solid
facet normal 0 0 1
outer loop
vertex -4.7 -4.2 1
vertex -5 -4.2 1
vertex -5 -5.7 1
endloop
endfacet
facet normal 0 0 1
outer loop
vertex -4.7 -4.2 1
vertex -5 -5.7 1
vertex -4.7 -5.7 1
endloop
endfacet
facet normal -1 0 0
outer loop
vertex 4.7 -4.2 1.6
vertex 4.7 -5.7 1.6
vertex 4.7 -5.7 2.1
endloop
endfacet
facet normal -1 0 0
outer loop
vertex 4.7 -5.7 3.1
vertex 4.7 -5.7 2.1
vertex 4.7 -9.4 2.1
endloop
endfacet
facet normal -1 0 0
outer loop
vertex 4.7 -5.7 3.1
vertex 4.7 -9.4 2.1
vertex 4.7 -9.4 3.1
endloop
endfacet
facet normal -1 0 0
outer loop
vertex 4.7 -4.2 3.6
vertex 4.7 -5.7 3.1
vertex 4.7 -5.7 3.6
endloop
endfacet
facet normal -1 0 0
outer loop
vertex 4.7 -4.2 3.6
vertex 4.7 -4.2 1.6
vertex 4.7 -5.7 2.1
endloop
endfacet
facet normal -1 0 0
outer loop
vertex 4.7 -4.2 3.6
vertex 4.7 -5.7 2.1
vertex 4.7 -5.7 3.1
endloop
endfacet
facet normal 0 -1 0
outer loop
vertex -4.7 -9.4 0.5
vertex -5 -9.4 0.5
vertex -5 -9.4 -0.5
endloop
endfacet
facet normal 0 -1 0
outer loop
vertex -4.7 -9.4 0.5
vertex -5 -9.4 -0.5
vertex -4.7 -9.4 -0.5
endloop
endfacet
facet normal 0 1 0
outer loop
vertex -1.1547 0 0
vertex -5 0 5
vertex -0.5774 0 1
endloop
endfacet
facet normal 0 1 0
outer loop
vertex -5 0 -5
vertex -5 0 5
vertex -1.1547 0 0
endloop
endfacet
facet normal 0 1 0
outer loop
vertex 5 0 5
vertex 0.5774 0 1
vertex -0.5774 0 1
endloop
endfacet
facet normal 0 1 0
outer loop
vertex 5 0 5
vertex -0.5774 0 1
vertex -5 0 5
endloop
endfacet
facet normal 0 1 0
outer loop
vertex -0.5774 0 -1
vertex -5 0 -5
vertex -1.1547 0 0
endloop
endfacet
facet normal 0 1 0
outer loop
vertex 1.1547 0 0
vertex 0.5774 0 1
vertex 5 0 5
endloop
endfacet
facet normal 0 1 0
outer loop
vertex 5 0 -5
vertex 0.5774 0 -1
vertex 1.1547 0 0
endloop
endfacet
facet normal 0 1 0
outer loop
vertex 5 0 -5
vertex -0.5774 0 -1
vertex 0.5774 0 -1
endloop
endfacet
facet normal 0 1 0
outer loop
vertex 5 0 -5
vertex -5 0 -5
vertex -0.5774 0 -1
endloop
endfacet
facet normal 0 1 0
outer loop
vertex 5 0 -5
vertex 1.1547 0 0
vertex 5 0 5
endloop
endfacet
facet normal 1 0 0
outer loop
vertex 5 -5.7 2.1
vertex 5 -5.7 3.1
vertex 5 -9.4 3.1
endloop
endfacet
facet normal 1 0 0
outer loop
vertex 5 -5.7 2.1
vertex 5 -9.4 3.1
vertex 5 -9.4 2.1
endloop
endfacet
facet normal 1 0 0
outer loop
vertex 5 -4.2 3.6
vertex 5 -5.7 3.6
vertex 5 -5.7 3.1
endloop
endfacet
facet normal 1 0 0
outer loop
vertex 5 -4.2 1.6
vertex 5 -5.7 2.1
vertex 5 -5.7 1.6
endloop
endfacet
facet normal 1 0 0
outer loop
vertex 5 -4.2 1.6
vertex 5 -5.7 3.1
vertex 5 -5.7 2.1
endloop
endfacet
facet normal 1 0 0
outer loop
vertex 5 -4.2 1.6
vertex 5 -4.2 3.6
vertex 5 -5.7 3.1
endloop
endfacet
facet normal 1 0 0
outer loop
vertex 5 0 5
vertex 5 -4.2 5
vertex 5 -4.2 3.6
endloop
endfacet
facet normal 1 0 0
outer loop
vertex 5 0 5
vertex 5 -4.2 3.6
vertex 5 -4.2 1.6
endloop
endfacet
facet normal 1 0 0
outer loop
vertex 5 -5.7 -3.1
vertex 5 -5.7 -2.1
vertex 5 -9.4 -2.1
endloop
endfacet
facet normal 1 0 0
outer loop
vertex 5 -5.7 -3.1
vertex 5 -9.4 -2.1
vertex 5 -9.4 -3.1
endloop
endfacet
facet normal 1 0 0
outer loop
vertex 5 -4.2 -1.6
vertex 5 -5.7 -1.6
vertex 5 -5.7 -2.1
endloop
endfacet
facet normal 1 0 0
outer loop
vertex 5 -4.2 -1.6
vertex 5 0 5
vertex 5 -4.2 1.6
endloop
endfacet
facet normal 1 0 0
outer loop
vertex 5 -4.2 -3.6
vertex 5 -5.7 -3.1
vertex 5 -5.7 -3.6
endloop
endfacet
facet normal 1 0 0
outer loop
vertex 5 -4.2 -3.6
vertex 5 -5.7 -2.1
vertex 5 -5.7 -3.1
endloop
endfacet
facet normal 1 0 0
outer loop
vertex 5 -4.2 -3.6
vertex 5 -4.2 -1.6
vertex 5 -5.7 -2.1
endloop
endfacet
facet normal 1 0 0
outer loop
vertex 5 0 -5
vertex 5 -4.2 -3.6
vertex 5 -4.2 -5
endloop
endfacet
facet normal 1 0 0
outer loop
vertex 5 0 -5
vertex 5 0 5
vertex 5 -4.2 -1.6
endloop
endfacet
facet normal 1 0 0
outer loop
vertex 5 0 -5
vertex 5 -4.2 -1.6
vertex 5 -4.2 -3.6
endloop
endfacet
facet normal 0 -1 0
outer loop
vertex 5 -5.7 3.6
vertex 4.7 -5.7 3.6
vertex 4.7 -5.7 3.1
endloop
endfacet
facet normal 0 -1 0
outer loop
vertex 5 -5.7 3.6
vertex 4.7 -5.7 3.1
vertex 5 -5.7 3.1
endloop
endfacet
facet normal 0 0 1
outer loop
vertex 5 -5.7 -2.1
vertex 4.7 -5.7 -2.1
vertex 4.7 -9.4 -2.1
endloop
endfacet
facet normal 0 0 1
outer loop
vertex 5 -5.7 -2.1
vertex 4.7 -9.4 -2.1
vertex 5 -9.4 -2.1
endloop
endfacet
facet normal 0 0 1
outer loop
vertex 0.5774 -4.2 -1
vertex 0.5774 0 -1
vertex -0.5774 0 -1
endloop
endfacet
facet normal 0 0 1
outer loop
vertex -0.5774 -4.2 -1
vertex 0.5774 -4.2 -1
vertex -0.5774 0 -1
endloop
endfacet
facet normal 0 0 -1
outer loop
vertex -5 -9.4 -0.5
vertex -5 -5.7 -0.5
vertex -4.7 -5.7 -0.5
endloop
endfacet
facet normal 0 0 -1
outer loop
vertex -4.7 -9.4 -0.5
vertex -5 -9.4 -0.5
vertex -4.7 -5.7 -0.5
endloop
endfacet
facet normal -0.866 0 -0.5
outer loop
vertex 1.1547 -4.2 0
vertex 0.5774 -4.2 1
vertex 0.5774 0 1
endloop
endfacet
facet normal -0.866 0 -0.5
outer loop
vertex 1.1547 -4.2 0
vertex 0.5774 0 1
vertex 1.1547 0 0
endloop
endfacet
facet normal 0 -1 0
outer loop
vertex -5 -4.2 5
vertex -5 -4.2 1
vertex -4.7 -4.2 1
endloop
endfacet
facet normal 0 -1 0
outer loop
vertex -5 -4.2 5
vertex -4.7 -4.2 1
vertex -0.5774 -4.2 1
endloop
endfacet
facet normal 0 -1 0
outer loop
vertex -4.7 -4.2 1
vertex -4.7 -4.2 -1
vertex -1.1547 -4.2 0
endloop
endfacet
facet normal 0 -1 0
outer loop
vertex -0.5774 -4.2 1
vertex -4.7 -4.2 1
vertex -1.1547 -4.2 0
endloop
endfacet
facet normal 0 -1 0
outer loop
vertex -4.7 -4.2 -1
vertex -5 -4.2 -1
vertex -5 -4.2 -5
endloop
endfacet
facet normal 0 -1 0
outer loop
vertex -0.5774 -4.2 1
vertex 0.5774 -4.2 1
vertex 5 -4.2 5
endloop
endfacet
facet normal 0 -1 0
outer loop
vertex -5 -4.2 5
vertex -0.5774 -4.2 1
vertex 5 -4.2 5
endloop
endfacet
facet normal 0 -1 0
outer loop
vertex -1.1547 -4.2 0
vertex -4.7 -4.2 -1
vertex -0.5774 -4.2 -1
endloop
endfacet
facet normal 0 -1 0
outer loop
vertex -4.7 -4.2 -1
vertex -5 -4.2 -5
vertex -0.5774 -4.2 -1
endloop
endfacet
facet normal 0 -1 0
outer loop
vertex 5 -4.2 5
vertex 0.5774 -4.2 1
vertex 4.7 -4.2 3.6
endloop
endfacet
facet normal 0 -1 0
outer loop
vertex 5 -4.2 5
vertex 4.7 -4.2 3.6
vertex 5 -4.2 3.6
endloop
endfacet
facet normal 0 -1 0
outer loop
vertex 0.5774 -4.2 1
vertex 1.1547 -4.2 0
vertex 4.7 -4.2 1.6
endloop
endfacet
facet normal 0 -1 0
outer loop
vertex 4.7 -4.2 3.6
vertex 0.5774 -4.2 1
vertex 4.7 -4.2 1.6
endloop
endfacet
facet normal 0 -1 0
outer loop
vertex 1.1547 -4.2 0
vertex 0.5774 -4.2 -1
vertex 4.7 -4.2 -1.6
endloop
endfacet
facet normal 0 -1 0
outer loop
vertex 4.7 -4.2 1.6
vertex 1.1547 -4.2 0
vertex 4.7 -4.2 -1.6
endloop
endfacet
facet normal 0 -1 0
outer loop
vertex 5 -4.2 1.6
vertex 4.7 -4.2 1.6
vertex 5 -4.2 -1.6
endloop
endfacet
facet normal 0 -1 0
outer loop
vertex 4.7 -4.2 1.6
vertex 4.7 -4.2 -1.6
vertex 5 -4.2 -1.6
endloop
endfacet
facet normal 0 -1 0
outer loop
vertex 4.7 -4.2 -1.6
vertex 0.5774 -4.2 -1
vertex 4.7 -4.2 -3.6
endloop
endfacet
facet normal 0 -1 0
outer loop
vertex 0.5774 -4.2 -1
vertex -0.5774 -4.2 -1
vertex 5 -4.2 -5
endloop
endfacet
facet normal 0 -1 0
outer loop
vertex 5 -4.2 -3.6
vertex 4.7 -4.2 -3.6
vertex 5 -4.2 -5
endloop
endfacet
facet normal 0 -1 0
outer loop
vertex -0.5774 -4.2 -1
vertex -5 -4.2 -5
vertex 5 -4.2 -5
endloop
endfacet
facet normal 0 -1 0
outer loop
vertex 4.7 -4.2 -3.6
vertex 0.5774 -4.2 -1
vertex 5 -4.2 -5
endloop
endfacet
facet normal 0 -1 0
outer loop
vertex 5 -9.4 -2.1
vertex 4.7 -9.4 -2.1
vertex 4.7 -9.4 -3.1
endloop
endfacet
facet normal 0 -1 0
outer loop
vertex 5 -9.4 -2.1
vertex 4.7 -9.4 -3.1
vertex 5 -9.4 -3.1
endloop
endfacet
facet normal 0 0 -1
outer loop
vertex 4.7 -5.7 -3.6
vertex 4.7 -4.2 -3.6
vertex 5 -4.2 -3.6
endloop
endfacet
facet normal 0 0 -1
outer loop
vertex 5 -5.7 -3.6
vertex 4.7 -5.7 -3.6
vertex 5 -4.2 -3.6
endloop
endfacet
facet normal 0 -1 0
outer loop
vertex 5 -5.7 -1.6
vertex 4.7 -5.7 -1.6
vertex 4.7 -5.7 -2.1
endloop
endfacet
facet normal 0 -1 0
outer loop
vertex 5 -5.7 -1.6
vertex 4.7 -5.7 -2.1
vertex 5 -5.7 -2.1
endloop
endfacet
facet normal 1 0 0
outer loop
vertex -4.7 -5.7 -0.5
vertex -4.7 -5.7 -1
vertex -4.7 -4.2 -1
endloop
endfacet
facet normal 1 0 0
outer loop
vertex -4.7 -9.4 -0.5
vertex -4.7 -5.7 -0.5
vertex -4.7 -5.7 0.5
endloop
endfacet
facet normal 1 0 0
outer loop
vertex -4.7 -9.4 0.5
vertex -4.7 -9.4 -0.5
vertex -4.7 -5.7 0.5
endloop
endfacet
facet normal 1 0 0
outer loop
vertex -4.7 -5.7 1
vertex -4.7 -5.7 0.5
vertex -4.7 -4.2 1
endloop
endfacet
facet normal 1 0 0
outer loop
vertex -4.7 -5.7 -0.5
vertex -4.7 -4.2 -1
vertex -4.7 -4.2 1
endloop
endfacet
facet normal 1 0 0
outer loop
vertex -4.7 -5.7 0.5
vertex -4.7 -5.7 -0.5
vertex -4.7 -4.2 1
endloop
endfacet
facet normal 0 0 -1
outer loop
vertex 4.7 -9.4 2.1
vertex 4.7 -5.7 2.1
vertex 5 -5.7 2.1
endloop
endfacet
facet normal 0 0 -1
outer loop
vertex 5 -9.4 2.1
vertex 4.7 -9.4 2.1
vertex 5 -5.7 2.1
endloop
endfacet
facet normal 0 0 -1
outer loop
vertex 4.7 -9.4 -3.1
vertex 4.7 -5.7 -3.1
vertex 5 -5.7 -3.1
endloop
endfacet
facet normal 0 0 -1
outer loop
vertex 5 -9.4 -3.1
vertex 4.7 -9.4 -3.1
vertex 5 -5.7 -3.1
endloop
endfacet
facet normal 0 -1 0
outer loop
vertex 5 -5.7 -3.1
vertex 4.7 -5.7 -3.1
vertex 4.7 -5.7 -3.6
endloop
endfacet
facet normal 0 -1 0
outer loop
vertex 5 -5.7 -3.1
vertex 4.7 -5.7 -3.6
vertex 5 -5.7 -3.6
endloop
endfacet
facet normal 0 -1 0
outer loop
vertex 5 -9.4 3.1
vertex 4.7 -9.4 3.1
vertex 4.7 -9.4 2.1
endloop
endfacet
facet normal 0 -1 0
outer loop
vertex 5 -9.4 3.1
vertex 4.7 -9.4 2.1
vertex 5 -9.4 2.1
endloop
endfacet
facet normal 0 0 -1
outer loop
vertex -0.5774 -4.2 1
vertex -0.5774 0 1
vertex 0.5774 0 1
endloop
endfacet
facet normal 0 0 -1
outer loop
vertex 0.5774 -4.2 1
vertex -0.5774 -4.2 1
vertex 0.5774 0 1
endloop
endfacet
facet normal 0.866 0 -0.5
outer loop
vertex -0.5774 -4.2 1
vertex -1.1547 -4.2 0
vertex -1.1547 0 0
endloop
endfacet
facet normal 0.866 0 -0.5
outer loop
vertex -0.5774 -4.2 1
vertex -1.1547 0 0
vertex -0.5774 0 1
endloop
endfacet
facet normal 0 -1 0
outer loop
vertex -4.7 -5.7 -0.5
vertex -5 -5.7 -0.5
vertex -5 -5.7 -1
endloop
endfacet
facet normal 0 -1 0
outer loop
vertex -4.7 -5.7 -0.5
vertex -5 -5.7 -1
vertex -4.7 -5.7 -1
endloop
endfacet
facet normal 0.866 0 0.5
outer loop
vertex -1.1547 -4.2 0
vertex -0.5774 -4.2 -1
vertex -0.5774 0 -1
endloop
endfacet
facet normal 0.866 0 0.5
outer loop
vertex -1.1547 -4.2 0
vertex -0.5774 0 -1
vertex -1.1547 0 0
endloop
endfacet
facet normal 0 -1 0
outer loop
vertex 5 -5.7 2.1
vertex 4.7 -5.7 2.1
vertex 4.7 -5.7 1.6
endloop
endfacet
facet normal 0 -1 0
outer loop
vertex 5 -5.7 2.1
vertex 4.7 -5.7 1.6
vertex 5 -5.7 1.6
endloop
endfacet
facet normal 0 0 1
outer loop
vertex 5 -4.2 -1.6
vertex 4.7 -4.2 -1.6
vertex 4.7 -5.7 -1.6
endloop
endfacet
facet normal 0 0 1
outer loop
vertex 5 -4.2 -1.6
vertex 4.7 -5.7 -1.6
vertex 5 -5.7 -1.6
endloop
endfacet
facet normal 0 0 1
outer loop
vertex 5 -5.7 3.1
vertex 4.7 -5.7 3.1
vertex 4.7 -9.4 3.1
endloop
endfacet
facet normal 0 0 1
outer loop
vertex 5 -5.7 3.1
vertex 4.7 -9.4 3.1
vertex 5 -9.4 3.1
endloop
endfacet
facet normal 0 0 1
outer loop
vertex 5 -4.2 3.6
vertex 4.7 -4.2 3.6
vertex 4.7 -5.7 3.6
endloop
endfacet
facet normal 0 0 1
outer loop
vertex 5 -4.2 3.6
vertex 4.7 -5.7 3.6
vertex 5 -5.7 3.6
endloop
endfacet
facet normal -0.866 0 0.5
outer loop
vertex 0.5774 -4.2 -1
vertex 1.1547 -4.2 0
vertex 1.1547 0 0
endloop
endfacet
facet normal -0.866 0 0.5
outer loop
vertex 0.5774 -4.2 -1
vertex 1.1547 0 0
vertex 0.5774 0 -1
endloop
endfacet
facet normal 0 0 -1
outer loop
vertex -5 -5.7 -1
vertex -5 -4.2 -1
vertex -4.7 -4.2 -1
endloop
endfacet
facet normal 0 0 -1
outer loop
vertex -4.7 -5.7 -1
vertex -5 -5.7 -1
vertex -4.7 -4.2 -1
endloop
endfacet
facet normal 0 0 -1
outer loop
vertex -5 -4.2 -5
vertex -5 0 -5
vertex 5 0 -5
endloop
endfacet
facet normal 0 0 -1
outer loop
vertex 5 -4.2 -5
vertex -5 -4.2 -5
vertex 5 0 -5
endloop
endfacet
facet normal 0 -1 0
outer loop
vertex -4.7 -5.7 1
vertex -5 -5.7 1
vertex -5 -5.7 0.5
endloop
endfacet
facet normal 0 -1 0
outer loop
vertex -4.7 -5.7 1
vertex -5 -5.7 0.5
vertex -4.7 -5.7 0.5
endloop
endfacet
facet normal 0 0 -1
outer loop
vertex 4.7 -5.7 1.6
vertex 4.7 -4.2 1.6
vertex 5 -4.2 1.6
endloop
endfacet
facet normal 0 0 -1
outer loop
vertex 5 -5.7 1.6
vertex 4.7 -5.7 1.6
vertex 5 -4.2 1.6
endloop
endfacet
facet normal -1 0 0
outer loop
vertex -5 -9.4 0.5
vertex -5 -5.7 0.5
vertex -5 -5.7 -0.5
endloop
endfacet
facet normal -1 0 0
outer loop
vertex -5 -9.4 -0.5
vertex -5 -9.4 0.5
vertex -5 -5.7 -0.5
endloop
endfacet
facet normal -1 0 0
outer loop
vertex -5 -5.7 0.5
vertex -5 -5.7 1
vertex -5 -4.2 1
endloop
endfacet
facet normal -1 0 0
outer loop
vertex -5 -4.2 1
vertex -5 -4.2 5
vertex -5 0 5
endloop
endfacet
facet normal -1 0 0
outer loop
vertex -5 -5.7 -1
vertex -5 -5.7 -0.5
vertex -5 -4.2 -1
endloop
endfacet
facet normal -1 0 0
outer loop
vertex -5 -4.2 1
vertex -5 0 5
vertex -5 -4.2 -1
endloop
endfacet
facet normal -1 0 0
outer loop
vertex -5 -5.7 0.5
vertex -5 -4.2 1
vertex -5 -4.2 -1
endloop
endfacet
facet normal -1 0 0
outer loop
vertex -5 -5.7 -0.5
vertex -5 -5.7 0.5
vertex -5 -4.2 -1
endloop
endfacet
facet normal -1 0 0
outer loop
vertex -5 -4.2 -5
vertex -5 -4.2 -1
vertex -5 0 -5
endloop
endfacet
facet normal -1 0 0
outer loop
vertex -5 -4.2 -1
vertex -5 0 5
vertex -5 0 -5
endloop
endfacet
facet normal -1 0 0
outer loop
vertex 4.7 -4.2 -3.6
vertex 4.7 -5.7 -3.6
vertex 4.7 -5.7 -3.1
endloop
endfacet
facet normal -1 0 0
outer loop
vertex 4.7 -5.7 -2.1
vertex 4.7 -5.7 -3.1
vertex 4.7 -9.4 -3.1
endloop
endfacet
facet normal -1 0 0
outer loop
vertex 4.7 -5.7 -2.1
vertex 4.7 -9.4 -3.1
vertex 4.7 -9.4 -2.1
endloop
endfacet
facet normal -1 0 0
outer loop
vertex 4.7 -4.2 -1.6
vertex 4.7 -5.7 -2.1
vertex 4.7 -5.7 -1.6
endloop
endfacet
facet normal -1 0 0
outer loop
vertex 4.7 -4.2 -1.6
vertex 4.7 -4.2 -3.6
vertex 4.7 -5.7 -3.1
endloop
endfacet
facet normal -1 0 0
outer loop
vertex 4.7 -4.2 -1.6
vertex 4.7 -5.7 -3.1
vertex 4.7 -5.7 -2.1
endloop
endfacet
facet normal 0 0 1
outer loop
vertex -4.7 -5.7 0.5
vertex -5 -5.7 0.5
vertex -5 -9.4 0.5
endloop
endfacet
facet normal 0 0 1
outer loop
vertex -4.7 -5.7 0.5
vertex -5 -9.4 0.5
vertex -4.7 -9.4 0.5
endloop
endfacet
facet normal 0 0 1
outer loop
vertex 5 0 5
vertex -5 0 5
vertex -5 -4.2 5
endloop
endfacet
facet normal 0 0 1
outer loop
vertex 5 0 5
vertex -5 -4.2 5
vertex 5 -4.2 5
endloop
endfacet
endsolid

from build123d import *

# Parameters (mm, degrees)
SKETCH1_W           = 10
SKETCH1_H           = 10
BOSS_EXTRUDE1_DEPTH = 4.2
CUT_EXTRUDE1_REACH  = 10.224
SKETCH3_W           = 0.3
SKETCH3_H           = 2
BOSS_EXTRUDE2_DEPTH = 1.5
SKETCH4_W           = 0.3
SKETCH4_H           = 1
BOSS_EXTRUDE3_DEPTH = 3.7


with BuildPart() as part:
    # Sketch1 → Boss-Extrude1 (new body)
    with BuildSketch(Plane(origin=(0, 0, 0), x_dir=(1, 0, 0), z_dir=(0, 1, 0))):
        Rectangle(SKETCH1_W, SKETCH1_H)
    extrude(amount=-BOSS_EXTRUDE1_DEPTH)

    # Sketch2 → Cut-Extrude1 (cut, up to next)
    with BuildSketch(Plane(origin=(0, 0, 0), x_dir=(1, 0, 0), z_dir=(0, 1, 0)), mode=Mode.PRIVATE) as cut_extrude1_sk1:
        Polygon((1.154700538, 0), (0.577350269, 1), (-0.577350269, 1), (-1.154700538, 0), (-0.577350269, -1), (0.577350269, -1), align=None)
    cut_extrude1_tool1 = extrude(cut_extrude1_sk1.sketch, amount=-CUT_EXTRUDE1_REACH, mode=Mode.PRIVATE) & part.part
    add(cut_extrude1_tool1.solids().sort_by_distance((0, 0, 0))[0], mode=Mode.SUBTRACT)

    # Sketch3 → Boss-Extrude2 (add)
    with BuildSketch(Plane.XZ.offset(4.2)):
        with Locations((4.85, 2.6)):
            Rectangle(SKETCH3_W, SKETCH3_H)
        with Locations((4.85, -2.6)):
            Rectangle(SKETCH3_W, SKETCH3_H)
        with Locations((-4.85, 0)):
            Rectangle(SKETCH3_W, SKETCH3_H)
    extrude(amount=BOSS_EXTRUDE2_DEPTH)

    # Sketch4 → Boss-Extrude3 (add)
    with BuildSketch(Plane.XZ.offset(5.7)):
        with Locations((4.85, -2.6)):
            Rectangle(SKETCH4_W, SKETCH4_H)
        with Locations((-4.85, 0)):
            Rectangle(SKETCH4_W, SKETCH4_H)
        with Locations((4.85, 2.6)):
            Rectangle(SKETCH4_W, SKETCH4_H)
    extrude(amount=BOSS_EXTRUDE3_DEPTH)


solid = part.part
